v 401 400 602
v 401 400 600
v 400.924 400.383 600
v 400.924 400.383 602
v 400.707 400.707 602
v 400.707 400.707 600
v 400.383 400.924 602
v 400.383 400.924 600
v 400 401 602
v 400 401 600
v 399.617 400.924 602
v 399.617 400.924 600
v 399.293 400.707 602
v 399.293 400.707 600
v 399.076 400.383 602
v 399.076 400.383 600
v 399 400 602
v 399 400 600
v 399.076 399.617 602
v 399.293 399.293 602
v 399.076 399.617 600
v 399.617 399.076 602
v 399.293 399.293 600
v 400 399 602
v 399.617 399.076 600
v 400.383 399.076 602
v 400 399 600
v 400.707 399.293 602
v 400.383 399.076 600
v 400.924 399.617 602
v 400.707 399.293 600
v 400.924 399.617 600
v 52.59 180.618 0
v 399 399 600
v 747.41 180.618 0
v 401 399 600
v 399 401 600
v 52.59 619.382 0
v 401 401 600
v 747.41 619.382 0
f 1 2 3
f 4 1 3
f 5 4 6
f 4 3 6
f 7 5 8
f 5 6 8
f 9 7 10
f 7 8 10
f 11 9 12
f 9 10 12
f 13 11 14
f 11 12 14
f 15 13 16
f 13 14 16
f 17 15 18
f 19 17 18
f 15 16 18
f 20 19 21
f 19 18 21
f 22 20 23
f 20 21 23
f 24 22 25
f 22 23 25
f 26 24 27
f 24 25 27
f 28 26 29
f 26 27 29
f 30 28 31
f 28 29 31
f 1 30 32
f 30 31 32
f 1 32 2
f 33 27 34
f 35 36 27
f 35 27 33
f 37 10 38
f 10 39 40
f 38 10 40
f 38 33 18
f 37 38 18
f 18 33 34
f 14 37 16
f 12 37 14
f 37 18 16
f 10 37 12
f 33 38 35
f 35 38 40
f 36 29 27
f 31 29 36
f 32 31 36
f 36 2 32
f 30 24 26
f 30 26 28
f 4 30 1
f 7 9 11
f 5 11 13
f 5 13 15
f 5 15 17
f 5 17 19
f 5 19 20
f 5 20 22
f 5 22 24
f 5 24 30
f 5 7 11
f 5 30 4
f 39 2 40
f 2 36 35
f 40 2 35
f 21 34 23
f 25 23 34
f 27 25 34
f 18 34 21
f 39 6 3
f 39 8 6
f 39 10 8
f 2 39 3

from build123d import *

# Parameters (mm, degrees)
SKETCH1_W           = 800
SKETCH1_H           = 800
BOSS_EXTRUDE1_DEPTH = 600
CUT_EXTRUDE1_DEPTH  = 801
CUT_EXTRUDE2_DEPTH  = 620.38214056
SKETCH4_R           = 1
BOSS_EXTRUDE2_DEPTH = 2


with BuildPart() as part:
    # Sketch1 → Boss-Extrude1 (new body)
    with BuildSketch(Plane.XY):
        with Locations((400, 400)):
            Rectangle(SKETCH1_W, SKETCH1_H)
    extrude(amount=BOSS_EXTRUDE1_DEPTH)

    # Sketch2 → Cut-Extrude1 (cut, through all)
    with BuildSketch(Plane(origin=(800, 0, 0), x_dir=(0, 0, -1), z_dir=(1, 0, 0))):
        Polygon((-600, 800), (-600, 401), (496.243490362, 800), align=None)
        Polygon((496.243490362, 0), (-600, 0), (-600, 399), align=None)
    extrude(amount=-CUT_EXTRUDE1_DEPTH, mode=Mode.SUBTRACT)

    # Sketch3 → Cut-Extrude2 (cut, through all)
    with BuildSketch(Plane.XZ):
        Polygon((401, 600), (800, -91.08827222), (800, 600), align=None)
        Polygon((0, 600), (0, -91.08827222), (399, 600), align=None)
    extrude(amount=-CUT_EXTRUDE2_DEPTH, mode=Mode.SUBTRACT)

    # Sketch4 → Boss-Extrude2 (add)
    with BuildSketch(Plane.XY.offset(600)):
        with Locations((400, 400)):
            Circle(SKETCH4_R)
    extrude(amount=BOSS_EXTRUDE2_DEPTH)


solid = part.part
